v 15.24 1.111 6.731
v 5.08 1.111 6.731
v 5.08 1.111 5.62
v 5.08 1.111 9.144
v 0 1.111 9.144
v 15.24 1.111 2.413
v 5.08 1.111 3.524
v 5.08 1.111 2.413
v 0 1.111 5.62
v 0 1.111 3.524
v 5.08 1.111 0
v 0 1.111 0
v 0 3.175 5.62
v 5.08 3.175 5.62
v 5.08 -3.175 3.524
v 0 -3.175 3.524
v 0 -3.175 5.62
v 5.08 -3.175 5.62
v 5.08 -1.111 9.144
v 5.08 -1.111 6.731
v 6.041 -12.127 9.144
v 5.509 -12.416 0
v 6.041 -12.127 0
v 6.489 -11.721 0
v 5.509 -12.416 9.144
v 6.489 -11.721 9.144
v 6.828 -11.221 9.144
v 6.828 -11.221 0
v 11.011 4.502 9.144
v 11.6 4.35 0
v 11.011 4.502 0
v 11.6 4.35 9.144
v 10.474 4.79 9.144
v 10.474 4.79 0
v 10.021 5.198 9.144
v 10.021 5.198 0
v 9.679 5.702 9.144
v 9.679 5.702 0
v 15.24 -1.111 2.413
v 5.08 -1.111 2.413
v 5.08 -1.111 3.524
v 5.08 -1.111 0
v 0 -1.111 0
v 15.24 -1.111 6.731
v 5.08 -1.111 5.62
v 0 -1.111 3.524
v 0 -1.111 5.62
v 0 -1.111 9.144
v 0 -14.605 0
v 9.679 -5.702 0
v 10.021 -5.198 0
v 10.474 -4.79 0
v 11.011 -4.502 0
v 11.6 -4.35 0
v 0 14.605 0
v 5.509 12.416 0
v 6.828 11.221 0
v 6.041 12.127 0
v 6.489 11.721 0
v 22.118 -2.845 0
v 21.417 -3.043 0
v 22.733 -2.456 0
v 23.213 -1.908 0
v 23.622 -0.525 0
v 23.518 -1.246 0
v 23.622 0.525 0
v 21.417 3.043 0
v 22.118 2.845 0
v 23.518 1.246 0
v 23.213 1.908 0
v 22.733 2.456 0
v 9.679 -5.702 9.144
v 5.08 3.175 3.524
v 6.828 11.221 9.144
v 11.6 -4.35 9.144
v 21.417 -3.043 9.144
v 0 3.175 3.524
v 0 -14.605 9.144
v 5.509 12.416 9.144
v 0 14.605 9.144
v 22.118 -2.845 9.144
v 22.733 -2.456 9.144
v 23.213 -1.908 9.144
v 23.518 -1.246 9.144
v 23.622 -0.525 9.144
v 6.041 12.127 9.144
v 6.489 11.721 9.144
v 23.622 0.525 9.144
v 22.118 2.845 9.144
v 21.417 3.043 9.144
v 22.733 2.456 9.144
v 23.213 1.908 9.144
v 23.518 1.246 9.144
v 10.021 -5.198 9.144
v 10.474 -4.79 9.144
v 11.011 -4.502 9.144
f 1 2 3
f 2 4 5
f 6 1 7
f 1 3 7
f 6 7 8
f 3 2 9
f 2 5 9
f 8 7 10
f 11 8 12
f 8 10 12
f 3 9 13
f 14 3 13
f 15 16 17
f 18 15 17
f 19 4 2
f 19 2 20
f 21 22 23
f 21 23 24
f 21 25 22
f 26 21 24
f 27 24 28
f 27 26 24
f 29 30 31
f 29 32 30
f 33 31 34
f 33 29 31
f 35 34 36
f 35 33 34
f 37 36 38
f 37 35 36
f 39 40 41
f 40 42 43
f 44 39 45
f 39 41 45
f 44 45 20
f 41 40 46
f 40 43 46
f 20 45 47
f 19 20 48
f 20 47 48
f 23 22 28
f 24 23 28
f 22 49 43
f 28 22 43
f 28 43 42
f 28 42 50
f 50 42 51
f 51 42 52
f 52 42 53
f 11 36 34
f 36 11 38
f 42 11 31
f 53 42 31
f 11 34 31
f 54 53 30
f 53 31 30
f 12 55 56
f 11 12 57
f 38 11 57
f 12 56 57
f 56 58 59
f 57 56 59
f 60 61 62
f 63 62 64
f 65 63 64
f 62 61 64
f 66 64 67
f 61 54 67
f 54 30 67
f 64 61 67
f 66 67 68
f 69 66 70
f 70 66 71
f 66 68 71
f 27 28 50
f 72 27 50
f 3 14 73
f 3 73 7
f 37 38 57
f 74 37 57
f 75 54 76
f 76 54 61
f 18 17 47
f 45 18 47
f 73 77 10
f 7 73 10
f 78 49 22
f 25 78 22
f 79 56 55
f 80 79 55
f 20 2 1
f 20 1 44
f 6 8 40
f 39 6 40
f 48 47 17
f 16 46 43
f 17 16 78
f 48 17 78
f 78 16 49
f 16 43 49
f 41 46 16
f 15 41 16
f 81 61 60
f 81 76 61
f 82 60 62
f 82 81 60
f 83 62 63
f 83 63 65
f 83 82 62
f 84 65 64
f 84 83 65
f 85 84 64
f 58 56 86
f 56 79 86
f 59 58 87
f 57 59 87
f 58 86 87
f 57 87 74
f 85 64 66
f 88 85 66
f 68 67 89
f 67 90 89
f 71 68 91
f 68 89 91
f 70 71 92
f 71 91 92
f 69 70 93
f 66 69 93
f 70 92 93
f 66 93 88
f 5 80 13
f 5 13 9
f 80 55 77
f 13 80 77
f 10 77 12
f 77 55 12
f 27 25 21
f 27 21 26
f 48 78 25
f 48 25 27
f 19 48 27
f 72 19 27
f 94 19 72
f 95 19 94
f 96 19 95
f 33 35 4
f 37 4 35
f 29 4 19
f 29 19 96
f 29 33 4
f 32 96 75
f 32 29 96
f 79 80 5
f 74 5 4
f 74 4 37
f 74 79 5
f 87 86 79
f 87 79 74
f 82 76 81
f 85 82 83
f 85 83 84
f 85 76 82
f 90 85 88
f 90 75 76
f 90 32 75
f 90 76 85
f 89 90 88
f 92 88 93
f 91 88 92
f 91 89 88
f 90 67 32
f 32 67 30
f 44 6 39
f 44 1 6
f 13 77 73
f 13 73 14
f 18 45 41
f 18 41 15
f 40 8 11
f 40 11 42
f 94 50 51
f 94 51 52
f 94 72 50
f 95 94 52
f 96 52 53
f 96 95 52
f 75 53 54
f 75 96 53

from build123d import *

# Parameters (mm, degrees)
F1_DEPTH = 9.144
F2_W     = 2.06375
F2_H     = 2.0955
F2_W_2   = 2.2225
F2_H_2   = 1.11125
F2_H_3   = 2.413
F3_DEPTH = 5.08
F4_DEPTH = 15.24
F5_R     = 2.54


with BuildPart() as f1:
    # F0 (on Top) → F1 (new body)
    with BuildSketch(Plane.XY):
        Polygon((23.622, 2.749807667), (10.287, 4.5246649534), (10.287, -4.5246649534), (23.622, -2.749807667), align=None)
        Polygon((6.3920377387, 12.065), (0, 14.605), (0, -14.605), (6.3920377387, -12.065), (10.287, -4.5246649534), (10.287, 4.5246649534), align=None)
    extrude(amount=F1_DEPTH)

    # F2 (on face) → F3 (cut)
    with BuildSketch(Plane(origin=(0, 0, 0), x_dir=(0, -1, 0), z_dir=(-1, 0, 0))):
        with Locations((-2.143125, 4.572)):
            Rectangle(F2_W, F2_H)
        with Locations((0, 4.572)):
            Rectangle(F2_W_2, F2_H)
        with Locations((0, 2.968625)):
            Rectangle(F2_W_2, F2_H_2)
        with Locations((2.143125, 4.572)):
            Rectangle(F2_W, F2_H)
        with Locations((0, 6.175375)):
            Rectangle(F2_W_2, F2_H_2)
        with Locations((0, 1.2065)):
            Rectangle(F2_W_2, F2_H_3)
        with Locations((0, 7.9375)):
            Rectangle(F2_W_2, F2_H_3)
    extrude(amount=-F3_DEPTH, mode=Mode.SUBTRACT)

    # F2 (on face) → F4 (cut)
    with BuildSketch(Plane(origin=(0, 0, 0), x_dir=(0, -1, 0), z_dir=(-1, 0, 0))):
        with Locations((0, 2.968625)):
            Rectangle(F2_W_2, F2_H_2)
        with Locations((0, 4.572)):
            Rectangle(F2_W_2, F2_H)
        with Locations((0, 6.175375)):
            Rectangle(F2_W_2, F2_H_2)
    extrude(amount=-F4_DEPTH, mode=Mode.SUBTRACT)

    # F5
    f5_edges = [f1.edges().sort_by_distance(p)[0] for p in [
        (23.622, 2.749808, 4.572),
        (23.622, -2.749808, 4.572),
        (10.287, 4.524665, 4.572),
        (6.392038, 12.065, 4.572),
        (10.287, -4.524665, 4.572),
        (6.392038, -12.065, 4.572),
    ]]
    fillet(f5_edges, radius=F5_R)


solid = f1.part
